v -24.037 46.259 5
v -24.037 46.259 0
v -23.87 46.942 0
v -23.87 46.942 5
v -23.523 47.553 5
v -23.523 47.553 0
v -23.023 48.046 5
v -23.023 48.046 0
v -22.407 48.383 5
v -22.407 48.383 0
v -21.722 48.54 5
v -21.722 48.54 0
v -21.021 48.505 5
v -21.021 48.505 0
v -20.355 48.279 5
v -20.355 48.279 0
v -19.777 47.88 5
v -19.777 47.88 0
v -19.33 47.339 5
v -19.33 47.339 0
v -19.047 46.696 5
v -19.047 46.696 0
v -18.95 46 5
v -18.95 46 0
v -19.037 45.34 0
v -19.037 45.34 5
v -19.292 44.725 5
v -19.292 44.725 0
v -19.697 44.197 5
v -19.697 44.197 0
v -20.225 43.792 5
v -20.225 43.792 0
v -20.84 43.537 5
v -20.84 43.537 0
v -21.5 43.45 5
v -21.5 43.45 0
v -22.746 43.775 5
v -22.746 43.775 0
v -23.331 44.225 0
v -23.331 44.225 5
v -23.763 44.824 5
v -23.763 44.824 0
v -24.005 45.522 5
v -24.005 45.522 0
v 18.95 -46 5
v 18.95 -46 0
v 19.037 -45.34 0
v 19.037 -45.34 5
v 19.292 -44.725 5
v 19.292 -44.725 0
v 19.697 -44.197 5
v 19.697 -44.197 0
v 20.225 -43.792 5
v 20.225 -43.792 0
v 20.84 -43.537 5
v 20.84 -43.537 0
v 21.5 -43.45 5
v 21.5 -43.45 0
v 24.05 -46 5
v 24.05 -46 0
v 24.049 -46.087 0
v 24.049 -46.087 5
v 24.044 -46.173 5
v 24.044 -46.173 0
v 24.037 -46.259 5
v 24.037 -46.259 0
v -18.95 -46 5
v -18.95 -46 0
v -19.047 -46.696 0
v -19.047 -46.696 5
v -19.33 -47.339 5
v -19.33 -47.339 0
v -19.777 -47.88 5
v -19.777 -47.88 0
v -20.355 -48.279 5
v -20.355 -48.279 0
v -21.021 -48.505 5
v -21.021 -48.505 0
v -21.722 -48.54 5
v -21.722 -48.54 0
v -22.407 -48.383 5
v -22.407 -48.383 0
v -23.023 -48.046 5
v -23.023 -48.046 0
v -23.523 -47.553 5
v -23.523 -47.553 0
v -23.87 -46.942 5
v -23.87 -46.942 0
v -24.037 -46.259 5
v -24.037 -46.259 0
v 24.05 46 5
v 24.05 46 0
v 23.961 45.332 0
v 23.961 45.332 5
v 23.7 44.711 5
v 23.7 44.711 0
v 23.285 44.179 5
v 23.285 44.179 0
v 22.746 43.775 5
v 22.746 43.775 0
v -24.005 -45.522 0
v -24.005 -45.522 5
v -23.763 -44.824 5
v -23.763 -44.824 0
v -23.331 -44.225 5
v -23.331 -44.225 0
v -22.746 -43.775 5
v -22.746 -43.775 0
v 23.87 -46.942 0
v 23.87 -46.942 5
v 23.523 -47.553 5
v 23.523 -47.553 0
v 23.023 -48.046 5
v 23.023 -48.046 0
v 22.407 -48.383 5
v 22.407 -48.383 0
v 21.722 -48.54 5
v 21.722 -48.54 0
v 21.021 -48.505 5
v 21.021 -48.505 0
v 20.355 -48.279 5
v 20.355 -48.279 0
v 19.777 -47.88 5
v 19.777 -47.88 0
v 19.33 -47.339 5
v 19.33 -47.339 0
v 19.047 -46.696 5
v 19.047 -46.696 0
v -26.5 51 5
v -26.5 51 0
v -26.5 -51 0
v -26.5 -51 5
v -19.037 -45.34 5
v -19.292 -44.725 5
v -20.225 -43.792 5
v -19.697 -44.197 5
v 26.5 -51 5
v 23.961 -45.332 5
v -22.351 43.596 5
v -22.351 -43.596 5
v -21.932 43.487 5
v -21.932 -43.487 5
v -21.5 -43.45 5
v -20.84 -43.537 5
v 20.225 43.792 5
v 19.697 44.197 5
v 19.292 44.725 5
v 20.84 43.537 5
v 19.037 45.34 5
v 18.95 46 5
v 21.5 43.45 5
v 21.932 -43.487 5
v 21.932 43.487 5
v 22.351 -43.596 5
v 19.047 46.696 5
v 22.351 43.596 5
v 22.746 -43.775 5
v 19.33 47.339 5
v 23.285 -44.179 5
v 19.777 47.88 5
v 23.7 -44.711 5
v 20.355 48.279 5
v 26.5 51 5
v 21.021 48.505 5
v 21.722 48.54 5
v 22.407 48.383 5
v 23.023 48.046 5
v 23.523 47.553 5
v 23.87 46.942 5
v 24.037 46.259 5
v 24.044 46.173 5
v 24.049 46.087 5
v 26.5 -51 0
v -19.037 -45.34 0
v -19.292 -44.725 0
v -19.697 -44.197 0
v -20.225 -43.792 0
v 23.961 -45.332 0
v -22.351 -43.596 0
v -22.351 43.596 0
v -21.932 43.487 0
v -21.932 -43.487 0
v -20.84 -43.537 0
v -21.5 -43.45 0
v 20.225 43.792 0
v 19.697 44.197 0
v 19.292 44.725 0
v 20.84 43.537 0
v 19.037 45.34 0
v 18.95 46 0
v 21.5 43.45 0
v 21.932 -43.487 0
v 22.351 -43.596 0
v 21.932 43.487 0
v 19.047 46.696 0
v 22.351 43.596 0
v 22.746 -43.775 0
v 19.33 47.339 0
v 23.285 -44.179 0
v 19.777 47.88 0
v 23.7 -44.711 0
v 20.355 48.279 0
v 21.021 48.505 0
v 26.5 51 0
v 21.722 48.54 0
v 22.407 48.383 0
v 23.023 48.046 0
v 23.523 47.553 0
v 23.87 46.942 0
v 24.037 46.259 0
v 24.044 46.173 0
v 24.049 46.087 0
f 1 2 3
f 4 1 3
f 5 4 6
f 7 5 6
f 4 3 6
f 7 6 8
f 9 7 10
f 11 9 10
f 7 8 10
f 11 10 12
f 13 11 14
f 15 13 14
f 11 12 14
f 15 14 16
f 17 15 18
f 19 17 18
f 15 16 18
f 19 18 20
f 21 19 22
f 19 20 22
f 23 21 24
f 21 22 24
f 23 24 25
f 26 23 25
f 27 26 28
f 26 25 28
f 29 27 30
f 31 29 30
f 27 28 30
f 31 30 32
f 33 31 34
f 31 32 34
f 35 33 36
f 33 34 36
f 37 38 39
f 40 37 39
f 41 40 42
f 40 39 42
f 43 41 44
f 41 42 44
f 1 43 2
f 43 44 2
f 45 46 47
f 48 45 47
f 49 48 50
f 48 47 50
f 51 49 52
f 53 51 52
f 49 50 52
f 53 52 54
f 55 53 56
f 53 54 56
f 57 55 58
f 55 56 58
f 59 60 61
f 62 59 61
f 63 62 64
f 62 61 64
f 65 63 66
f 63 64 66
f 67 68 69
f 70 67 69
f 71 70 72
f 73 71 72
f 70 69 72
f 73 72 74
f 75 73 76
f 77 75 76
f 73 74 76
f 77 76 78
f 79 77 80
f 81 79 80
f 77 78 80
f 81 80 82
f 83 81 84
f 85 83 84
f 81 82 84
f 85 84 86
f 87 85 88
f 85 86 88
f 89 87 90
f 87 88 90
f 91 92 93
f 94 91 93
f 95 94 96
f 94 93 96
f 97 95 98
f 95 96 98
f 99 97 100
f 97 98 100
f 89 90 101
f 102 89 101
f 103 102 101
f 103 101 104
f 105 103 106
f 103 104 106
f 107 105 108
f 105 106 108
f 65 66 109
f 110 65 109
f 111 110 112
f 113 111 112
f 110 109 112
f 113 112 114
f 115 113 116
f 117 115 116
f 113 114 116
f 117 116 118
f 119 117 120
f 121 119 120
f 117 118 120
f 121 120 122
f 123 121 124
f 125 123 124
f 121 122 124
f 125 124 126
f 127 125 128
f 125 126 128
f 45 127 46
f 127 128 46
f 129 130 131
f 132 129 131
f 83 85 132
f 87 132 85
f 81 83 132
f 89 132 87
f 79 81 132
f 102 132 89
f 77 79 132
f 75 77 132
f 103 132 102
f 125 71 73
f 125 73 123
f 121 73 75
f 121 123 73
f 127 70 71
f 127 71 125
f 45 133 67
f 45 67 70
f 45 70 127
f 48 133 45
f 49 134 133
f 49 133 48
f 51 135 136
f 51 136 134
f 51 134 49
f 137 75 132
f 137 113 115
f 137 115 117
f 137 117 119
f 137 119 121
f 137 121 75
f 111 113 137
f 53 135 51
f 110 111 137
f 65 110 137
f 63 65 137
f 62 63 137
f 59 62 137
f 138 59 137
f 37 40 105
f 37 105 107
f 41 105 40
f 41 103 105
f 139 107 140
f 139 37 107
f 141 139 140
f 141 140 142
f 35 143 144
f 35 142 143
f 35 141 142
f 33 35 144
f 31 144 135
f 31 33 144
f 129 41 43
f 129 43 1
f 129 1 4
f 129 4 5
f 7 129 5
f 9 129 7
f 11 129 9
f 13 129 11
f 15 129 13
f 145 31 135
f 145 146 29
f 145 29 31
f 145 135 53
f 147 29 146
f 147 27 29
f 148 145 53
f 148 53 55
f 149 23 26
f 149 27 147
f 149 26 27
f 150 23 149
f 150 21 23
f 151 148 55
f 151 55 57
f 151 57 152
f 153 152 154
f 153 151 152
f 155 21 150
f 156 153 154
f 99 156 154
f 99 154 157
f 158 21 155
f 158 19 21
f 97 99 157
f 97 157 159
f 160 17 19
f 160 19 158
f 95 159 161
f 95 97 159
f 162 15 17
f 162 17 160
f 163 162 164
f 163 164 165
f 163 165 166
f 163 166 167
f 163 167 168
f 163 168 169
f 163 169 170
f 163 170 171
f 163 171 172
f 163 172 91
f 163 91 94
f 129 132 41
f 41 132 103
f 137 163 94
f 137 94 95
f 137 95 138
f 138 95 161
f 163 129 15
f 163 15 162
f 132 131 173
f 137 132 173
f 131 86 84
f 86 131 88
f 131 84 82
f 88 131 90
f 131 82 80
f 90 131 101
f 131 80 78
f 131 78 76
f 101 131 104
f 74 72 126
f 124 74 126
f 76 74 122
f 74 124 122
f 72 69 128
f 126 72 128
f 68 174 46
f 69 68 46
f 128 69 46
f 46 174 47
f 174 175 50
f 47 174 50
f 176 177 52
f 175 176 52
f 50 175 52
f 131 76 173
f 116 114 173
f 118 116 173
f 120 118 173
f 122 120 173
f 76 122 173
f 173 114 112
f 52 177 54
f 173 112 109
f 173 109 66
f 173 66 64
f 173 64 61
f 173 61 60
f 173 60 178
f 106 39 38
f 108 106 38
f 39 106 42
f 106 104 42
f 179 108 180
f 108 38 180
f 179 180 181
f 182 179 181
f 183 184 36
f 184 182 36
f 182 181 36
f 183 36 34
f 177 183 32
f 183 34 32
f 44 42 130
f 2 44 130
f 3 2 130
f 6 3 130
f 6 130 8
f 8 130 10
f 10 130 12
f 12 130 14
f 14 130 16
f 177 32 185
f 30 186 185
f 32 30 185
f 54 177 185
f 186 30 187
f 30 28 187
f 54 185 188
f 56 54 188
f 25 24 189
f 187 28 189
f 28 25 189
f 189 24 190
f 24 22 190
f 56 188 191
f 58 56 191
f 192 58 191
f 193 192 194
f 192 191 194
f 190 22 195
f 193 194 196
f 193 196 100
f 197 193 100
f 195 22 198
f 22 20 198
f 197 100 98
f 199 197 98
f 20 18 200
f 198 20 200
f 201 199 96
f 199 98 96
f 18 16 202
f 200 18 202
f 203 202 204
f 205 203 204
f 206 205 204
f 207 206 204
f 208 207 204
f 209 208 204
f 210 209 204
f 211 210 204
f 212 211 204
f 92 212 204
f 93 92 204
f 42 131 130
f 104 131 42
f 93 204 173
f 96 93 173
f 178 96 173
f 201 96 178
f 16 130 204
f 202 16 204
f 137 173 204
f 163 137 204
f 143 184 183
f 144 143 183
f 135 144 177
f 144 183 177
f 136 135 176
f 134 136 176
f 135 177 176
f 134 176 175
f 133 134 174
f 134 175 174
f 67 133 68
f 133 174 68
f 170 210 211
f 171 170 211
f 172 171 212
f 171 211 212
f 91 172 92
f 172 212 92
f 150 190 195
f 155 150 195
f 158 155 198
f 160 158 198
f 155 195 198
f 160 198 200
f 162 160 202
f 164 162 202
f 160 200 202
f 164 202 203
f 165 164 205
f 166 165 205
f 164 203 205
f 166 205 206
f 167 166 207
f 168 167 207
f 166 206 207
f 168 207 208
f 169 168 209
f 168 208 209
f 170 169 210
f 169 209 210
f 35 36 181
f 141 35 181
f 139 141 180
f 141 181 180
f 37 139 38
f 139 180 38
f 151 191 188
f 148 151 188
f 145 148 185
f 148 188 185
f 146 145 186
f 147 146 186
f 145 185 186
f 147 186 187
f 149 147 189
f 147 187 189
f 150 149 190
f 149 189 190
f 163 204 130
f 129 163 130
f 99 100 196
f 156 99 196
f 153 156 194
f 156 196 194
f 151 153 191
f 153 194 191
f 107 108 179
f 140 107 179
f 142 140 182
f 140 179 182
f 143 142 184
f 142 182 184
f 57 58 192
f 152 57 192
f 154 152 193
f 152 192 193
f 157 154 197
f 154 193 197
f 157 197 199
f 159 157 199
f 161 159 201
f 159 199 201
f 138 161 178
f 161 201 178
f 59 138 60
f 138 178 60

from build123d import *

# Parameters (mm, degrees)
F1_DEPTH = 5


with BuildPart() as f1:
    # F0 (on Top) → F1 (new body)
    with BuildSketch(Plane.XY):
        with BuildLine():
            Line((-24.0367678096, 46.2594399355), (-26.5, 51))
            Line((-26.5, 51), (-26.5, -51))
            Line((-26.5, -51), (-24.0367678096, -46.2594399355))
            ThreePointArc((-24.0367678096, -46.2594399355), (-23.7627659491, -44.8242490657), (-22.7458705011, -43.7750715305))
            Line((-22.7458705011, -43.7750715305), (-21.5, -41.3773584906))
            Line((-21.5, -41.3773584906), (-21.5, 41.3773584906))
            Line((-21.5, 41.3773584906), (-22.7458705011, 43.7750715305))
            ThreePointArc((-22.7458705011, 43.7750715305), (-23.7627659491, 44.8242490657), (-24.0367678096, 46.2594399355))
        make_face()
        with BuildLine():
            Line((26.5, 51), (-26.5, 51))
            Line((-26.5, 51), (-24.0367678096, 46.2594399355))
            ThreePointArc((-24.0367678096, 46.2594399355), (-21.3701114218, 48.5466898039), (-18.95, 46))
            Line((-18.95, 46), (18.95, 46))
            ThreePointArc((18.95, 46), (21.3701114218, 48.5466898039), (24.0367678096, 46.2594399355))
            Line((24.0367678096, 46.2594399355), (26.5, 51))
        make_face()
        with BuildLine():
            Line((26.5, -51), (26.5, 51))
            Line((26.5, 51), (24.0367678096, 46.2594399355))
            ThreePointArc((24.0367678096, 46.2594399355), (24.0466898039, 46.1298885782), (24.05, 46))
            ThreePointArc((24.05, 46), (23.6999397467, 44.7105175026), (22.7458705011, 43.7750715305))
            Line((22.7458705011, 43.7750715305), (21.5, 41.3773584906))
            Line((21.5, 41.3773584906), (21.5, -41.3773584906))
            Line((21.5, -41.3773584906), (22.7458705011, -43.7750715305))
            ThreePointArc((22.7458705011, -43.7750715305), (23.6999397467, -44.7105175026), (24.05, -46))
            ThreePointArc((24.05, -46), (24.0466898039, -46.1298885782), (24.0367678096, -46.2594399355))
            Line((24.0367678096, -46.2594399355), (26.5, -51))
        make_face()
        with BuildLine():
            Line((-24.0367678096, -46.2594399355), (-26.5, -51))
            Line((-26.5, -51), (26.5, -51))
            Line((26.5, -51), (24.0367678096, -46.2594399355))
            ThreePointArc((24.0367678096, -46.2594399355), (21.3701114218, -48.5466898039), (18.95, -46))
            Line((18.95, -46), (-18.95, -46))
            ThreePointArc((-18.95, -46), (-21.3701114218, -48.5466898039), (-24.0367678096, -46.2594399355))
        make_face()
        with BuildLine():
            ThreePointArc((-21.5, -43.45), (-19.696877708, -44.196877708), (-18.95, -46))
            Line((-18.95, -46), (18.95, -46))
            ThreePointArc((18.95, -46), (19.696877708, -44.196877708), (21.5, -43.45))
            Line((21.5, -43.45), (21.5, -41.3773584906))
            Line((21.5, -41.3773584906), (0, 0))
            Line((0, 0), (-21.5, -41.3773584906))
            Line((-21.5, -41.3773584906), (-21.5, -43.45))
        make_face()
        Polygon((21.5, -41.3773584906), (21.5, 41.3773584906), (0, 0), align=None)
        with BuildLine():
            Line((18.95, 46), (-18.95, 46))
            ThreePointArc((-18.95, 46), (-19.696877708, 44.196877708), (-21.5, 43.45))
            Line((-21.5, 43.45), (-21.5, 41.3773584906))
            Line((-21.5, 41.3773584906), (0, 0))
            Line((0, 0), (21.5, 41.3773584906))
            Line((21.5, 41.3773584906), (21.5, 43.45))
            ThreePointArc((21.5, 43.45), (19.696877708, 44.196877708), (18.95, 46))
        make_face()
        Polygon((0, 0), (-21.5, 41.3773584906), (-21.5, -41.3773584906), align=None)
        with BuildLine():
            ThreePointArc((21.5, -43.45), (22.143790495, -43.5326058688), (22.7458705011, -43.7750715305))
            Line((22.7458705011, -43.7750715305), (21.5, -41.3773584906))
            Line((21.5, -41.3773584906), (21.5, -43.45))
        make_face()
        with BuildLine():
            Line((-21.5, -41.3773584906), (-22.7458705011, -43.7750715305))
            ThreePointArc((-22.7458705011, -43.7750715305), (-22.143790495, -43.5326058688), (-21.5, -43.45))
            Line((-21.5, -43.45), (-21.5, -41.3773584906))
        make_face()
        with BuildLine():
            Line((21.5, 41.3773584906), (22.7458705011, 43.7750715305))
            ThreePointArc((22.7458705011, 43.7750715305), (22.143790495, 43.5326058688), (21.5, 43.45))
            Line((21.5, 43.45), (21.5, 41.3773584906))
        make_face()
        with BuildLine():
            ThreePointArc((-21.5, 43.45), (-22.143790495, 43.5326058688), (-22.7458705011, 43.7750715305))
            Line((-22.7458705011, 43.7750715305), (-21.5, 41.3773584906))
            Line((-21.5, 41.3773584906), (-21.5, 43.45))
        make_face()
    extrude(amount=F1_DEPTH)


solid = f1.part
